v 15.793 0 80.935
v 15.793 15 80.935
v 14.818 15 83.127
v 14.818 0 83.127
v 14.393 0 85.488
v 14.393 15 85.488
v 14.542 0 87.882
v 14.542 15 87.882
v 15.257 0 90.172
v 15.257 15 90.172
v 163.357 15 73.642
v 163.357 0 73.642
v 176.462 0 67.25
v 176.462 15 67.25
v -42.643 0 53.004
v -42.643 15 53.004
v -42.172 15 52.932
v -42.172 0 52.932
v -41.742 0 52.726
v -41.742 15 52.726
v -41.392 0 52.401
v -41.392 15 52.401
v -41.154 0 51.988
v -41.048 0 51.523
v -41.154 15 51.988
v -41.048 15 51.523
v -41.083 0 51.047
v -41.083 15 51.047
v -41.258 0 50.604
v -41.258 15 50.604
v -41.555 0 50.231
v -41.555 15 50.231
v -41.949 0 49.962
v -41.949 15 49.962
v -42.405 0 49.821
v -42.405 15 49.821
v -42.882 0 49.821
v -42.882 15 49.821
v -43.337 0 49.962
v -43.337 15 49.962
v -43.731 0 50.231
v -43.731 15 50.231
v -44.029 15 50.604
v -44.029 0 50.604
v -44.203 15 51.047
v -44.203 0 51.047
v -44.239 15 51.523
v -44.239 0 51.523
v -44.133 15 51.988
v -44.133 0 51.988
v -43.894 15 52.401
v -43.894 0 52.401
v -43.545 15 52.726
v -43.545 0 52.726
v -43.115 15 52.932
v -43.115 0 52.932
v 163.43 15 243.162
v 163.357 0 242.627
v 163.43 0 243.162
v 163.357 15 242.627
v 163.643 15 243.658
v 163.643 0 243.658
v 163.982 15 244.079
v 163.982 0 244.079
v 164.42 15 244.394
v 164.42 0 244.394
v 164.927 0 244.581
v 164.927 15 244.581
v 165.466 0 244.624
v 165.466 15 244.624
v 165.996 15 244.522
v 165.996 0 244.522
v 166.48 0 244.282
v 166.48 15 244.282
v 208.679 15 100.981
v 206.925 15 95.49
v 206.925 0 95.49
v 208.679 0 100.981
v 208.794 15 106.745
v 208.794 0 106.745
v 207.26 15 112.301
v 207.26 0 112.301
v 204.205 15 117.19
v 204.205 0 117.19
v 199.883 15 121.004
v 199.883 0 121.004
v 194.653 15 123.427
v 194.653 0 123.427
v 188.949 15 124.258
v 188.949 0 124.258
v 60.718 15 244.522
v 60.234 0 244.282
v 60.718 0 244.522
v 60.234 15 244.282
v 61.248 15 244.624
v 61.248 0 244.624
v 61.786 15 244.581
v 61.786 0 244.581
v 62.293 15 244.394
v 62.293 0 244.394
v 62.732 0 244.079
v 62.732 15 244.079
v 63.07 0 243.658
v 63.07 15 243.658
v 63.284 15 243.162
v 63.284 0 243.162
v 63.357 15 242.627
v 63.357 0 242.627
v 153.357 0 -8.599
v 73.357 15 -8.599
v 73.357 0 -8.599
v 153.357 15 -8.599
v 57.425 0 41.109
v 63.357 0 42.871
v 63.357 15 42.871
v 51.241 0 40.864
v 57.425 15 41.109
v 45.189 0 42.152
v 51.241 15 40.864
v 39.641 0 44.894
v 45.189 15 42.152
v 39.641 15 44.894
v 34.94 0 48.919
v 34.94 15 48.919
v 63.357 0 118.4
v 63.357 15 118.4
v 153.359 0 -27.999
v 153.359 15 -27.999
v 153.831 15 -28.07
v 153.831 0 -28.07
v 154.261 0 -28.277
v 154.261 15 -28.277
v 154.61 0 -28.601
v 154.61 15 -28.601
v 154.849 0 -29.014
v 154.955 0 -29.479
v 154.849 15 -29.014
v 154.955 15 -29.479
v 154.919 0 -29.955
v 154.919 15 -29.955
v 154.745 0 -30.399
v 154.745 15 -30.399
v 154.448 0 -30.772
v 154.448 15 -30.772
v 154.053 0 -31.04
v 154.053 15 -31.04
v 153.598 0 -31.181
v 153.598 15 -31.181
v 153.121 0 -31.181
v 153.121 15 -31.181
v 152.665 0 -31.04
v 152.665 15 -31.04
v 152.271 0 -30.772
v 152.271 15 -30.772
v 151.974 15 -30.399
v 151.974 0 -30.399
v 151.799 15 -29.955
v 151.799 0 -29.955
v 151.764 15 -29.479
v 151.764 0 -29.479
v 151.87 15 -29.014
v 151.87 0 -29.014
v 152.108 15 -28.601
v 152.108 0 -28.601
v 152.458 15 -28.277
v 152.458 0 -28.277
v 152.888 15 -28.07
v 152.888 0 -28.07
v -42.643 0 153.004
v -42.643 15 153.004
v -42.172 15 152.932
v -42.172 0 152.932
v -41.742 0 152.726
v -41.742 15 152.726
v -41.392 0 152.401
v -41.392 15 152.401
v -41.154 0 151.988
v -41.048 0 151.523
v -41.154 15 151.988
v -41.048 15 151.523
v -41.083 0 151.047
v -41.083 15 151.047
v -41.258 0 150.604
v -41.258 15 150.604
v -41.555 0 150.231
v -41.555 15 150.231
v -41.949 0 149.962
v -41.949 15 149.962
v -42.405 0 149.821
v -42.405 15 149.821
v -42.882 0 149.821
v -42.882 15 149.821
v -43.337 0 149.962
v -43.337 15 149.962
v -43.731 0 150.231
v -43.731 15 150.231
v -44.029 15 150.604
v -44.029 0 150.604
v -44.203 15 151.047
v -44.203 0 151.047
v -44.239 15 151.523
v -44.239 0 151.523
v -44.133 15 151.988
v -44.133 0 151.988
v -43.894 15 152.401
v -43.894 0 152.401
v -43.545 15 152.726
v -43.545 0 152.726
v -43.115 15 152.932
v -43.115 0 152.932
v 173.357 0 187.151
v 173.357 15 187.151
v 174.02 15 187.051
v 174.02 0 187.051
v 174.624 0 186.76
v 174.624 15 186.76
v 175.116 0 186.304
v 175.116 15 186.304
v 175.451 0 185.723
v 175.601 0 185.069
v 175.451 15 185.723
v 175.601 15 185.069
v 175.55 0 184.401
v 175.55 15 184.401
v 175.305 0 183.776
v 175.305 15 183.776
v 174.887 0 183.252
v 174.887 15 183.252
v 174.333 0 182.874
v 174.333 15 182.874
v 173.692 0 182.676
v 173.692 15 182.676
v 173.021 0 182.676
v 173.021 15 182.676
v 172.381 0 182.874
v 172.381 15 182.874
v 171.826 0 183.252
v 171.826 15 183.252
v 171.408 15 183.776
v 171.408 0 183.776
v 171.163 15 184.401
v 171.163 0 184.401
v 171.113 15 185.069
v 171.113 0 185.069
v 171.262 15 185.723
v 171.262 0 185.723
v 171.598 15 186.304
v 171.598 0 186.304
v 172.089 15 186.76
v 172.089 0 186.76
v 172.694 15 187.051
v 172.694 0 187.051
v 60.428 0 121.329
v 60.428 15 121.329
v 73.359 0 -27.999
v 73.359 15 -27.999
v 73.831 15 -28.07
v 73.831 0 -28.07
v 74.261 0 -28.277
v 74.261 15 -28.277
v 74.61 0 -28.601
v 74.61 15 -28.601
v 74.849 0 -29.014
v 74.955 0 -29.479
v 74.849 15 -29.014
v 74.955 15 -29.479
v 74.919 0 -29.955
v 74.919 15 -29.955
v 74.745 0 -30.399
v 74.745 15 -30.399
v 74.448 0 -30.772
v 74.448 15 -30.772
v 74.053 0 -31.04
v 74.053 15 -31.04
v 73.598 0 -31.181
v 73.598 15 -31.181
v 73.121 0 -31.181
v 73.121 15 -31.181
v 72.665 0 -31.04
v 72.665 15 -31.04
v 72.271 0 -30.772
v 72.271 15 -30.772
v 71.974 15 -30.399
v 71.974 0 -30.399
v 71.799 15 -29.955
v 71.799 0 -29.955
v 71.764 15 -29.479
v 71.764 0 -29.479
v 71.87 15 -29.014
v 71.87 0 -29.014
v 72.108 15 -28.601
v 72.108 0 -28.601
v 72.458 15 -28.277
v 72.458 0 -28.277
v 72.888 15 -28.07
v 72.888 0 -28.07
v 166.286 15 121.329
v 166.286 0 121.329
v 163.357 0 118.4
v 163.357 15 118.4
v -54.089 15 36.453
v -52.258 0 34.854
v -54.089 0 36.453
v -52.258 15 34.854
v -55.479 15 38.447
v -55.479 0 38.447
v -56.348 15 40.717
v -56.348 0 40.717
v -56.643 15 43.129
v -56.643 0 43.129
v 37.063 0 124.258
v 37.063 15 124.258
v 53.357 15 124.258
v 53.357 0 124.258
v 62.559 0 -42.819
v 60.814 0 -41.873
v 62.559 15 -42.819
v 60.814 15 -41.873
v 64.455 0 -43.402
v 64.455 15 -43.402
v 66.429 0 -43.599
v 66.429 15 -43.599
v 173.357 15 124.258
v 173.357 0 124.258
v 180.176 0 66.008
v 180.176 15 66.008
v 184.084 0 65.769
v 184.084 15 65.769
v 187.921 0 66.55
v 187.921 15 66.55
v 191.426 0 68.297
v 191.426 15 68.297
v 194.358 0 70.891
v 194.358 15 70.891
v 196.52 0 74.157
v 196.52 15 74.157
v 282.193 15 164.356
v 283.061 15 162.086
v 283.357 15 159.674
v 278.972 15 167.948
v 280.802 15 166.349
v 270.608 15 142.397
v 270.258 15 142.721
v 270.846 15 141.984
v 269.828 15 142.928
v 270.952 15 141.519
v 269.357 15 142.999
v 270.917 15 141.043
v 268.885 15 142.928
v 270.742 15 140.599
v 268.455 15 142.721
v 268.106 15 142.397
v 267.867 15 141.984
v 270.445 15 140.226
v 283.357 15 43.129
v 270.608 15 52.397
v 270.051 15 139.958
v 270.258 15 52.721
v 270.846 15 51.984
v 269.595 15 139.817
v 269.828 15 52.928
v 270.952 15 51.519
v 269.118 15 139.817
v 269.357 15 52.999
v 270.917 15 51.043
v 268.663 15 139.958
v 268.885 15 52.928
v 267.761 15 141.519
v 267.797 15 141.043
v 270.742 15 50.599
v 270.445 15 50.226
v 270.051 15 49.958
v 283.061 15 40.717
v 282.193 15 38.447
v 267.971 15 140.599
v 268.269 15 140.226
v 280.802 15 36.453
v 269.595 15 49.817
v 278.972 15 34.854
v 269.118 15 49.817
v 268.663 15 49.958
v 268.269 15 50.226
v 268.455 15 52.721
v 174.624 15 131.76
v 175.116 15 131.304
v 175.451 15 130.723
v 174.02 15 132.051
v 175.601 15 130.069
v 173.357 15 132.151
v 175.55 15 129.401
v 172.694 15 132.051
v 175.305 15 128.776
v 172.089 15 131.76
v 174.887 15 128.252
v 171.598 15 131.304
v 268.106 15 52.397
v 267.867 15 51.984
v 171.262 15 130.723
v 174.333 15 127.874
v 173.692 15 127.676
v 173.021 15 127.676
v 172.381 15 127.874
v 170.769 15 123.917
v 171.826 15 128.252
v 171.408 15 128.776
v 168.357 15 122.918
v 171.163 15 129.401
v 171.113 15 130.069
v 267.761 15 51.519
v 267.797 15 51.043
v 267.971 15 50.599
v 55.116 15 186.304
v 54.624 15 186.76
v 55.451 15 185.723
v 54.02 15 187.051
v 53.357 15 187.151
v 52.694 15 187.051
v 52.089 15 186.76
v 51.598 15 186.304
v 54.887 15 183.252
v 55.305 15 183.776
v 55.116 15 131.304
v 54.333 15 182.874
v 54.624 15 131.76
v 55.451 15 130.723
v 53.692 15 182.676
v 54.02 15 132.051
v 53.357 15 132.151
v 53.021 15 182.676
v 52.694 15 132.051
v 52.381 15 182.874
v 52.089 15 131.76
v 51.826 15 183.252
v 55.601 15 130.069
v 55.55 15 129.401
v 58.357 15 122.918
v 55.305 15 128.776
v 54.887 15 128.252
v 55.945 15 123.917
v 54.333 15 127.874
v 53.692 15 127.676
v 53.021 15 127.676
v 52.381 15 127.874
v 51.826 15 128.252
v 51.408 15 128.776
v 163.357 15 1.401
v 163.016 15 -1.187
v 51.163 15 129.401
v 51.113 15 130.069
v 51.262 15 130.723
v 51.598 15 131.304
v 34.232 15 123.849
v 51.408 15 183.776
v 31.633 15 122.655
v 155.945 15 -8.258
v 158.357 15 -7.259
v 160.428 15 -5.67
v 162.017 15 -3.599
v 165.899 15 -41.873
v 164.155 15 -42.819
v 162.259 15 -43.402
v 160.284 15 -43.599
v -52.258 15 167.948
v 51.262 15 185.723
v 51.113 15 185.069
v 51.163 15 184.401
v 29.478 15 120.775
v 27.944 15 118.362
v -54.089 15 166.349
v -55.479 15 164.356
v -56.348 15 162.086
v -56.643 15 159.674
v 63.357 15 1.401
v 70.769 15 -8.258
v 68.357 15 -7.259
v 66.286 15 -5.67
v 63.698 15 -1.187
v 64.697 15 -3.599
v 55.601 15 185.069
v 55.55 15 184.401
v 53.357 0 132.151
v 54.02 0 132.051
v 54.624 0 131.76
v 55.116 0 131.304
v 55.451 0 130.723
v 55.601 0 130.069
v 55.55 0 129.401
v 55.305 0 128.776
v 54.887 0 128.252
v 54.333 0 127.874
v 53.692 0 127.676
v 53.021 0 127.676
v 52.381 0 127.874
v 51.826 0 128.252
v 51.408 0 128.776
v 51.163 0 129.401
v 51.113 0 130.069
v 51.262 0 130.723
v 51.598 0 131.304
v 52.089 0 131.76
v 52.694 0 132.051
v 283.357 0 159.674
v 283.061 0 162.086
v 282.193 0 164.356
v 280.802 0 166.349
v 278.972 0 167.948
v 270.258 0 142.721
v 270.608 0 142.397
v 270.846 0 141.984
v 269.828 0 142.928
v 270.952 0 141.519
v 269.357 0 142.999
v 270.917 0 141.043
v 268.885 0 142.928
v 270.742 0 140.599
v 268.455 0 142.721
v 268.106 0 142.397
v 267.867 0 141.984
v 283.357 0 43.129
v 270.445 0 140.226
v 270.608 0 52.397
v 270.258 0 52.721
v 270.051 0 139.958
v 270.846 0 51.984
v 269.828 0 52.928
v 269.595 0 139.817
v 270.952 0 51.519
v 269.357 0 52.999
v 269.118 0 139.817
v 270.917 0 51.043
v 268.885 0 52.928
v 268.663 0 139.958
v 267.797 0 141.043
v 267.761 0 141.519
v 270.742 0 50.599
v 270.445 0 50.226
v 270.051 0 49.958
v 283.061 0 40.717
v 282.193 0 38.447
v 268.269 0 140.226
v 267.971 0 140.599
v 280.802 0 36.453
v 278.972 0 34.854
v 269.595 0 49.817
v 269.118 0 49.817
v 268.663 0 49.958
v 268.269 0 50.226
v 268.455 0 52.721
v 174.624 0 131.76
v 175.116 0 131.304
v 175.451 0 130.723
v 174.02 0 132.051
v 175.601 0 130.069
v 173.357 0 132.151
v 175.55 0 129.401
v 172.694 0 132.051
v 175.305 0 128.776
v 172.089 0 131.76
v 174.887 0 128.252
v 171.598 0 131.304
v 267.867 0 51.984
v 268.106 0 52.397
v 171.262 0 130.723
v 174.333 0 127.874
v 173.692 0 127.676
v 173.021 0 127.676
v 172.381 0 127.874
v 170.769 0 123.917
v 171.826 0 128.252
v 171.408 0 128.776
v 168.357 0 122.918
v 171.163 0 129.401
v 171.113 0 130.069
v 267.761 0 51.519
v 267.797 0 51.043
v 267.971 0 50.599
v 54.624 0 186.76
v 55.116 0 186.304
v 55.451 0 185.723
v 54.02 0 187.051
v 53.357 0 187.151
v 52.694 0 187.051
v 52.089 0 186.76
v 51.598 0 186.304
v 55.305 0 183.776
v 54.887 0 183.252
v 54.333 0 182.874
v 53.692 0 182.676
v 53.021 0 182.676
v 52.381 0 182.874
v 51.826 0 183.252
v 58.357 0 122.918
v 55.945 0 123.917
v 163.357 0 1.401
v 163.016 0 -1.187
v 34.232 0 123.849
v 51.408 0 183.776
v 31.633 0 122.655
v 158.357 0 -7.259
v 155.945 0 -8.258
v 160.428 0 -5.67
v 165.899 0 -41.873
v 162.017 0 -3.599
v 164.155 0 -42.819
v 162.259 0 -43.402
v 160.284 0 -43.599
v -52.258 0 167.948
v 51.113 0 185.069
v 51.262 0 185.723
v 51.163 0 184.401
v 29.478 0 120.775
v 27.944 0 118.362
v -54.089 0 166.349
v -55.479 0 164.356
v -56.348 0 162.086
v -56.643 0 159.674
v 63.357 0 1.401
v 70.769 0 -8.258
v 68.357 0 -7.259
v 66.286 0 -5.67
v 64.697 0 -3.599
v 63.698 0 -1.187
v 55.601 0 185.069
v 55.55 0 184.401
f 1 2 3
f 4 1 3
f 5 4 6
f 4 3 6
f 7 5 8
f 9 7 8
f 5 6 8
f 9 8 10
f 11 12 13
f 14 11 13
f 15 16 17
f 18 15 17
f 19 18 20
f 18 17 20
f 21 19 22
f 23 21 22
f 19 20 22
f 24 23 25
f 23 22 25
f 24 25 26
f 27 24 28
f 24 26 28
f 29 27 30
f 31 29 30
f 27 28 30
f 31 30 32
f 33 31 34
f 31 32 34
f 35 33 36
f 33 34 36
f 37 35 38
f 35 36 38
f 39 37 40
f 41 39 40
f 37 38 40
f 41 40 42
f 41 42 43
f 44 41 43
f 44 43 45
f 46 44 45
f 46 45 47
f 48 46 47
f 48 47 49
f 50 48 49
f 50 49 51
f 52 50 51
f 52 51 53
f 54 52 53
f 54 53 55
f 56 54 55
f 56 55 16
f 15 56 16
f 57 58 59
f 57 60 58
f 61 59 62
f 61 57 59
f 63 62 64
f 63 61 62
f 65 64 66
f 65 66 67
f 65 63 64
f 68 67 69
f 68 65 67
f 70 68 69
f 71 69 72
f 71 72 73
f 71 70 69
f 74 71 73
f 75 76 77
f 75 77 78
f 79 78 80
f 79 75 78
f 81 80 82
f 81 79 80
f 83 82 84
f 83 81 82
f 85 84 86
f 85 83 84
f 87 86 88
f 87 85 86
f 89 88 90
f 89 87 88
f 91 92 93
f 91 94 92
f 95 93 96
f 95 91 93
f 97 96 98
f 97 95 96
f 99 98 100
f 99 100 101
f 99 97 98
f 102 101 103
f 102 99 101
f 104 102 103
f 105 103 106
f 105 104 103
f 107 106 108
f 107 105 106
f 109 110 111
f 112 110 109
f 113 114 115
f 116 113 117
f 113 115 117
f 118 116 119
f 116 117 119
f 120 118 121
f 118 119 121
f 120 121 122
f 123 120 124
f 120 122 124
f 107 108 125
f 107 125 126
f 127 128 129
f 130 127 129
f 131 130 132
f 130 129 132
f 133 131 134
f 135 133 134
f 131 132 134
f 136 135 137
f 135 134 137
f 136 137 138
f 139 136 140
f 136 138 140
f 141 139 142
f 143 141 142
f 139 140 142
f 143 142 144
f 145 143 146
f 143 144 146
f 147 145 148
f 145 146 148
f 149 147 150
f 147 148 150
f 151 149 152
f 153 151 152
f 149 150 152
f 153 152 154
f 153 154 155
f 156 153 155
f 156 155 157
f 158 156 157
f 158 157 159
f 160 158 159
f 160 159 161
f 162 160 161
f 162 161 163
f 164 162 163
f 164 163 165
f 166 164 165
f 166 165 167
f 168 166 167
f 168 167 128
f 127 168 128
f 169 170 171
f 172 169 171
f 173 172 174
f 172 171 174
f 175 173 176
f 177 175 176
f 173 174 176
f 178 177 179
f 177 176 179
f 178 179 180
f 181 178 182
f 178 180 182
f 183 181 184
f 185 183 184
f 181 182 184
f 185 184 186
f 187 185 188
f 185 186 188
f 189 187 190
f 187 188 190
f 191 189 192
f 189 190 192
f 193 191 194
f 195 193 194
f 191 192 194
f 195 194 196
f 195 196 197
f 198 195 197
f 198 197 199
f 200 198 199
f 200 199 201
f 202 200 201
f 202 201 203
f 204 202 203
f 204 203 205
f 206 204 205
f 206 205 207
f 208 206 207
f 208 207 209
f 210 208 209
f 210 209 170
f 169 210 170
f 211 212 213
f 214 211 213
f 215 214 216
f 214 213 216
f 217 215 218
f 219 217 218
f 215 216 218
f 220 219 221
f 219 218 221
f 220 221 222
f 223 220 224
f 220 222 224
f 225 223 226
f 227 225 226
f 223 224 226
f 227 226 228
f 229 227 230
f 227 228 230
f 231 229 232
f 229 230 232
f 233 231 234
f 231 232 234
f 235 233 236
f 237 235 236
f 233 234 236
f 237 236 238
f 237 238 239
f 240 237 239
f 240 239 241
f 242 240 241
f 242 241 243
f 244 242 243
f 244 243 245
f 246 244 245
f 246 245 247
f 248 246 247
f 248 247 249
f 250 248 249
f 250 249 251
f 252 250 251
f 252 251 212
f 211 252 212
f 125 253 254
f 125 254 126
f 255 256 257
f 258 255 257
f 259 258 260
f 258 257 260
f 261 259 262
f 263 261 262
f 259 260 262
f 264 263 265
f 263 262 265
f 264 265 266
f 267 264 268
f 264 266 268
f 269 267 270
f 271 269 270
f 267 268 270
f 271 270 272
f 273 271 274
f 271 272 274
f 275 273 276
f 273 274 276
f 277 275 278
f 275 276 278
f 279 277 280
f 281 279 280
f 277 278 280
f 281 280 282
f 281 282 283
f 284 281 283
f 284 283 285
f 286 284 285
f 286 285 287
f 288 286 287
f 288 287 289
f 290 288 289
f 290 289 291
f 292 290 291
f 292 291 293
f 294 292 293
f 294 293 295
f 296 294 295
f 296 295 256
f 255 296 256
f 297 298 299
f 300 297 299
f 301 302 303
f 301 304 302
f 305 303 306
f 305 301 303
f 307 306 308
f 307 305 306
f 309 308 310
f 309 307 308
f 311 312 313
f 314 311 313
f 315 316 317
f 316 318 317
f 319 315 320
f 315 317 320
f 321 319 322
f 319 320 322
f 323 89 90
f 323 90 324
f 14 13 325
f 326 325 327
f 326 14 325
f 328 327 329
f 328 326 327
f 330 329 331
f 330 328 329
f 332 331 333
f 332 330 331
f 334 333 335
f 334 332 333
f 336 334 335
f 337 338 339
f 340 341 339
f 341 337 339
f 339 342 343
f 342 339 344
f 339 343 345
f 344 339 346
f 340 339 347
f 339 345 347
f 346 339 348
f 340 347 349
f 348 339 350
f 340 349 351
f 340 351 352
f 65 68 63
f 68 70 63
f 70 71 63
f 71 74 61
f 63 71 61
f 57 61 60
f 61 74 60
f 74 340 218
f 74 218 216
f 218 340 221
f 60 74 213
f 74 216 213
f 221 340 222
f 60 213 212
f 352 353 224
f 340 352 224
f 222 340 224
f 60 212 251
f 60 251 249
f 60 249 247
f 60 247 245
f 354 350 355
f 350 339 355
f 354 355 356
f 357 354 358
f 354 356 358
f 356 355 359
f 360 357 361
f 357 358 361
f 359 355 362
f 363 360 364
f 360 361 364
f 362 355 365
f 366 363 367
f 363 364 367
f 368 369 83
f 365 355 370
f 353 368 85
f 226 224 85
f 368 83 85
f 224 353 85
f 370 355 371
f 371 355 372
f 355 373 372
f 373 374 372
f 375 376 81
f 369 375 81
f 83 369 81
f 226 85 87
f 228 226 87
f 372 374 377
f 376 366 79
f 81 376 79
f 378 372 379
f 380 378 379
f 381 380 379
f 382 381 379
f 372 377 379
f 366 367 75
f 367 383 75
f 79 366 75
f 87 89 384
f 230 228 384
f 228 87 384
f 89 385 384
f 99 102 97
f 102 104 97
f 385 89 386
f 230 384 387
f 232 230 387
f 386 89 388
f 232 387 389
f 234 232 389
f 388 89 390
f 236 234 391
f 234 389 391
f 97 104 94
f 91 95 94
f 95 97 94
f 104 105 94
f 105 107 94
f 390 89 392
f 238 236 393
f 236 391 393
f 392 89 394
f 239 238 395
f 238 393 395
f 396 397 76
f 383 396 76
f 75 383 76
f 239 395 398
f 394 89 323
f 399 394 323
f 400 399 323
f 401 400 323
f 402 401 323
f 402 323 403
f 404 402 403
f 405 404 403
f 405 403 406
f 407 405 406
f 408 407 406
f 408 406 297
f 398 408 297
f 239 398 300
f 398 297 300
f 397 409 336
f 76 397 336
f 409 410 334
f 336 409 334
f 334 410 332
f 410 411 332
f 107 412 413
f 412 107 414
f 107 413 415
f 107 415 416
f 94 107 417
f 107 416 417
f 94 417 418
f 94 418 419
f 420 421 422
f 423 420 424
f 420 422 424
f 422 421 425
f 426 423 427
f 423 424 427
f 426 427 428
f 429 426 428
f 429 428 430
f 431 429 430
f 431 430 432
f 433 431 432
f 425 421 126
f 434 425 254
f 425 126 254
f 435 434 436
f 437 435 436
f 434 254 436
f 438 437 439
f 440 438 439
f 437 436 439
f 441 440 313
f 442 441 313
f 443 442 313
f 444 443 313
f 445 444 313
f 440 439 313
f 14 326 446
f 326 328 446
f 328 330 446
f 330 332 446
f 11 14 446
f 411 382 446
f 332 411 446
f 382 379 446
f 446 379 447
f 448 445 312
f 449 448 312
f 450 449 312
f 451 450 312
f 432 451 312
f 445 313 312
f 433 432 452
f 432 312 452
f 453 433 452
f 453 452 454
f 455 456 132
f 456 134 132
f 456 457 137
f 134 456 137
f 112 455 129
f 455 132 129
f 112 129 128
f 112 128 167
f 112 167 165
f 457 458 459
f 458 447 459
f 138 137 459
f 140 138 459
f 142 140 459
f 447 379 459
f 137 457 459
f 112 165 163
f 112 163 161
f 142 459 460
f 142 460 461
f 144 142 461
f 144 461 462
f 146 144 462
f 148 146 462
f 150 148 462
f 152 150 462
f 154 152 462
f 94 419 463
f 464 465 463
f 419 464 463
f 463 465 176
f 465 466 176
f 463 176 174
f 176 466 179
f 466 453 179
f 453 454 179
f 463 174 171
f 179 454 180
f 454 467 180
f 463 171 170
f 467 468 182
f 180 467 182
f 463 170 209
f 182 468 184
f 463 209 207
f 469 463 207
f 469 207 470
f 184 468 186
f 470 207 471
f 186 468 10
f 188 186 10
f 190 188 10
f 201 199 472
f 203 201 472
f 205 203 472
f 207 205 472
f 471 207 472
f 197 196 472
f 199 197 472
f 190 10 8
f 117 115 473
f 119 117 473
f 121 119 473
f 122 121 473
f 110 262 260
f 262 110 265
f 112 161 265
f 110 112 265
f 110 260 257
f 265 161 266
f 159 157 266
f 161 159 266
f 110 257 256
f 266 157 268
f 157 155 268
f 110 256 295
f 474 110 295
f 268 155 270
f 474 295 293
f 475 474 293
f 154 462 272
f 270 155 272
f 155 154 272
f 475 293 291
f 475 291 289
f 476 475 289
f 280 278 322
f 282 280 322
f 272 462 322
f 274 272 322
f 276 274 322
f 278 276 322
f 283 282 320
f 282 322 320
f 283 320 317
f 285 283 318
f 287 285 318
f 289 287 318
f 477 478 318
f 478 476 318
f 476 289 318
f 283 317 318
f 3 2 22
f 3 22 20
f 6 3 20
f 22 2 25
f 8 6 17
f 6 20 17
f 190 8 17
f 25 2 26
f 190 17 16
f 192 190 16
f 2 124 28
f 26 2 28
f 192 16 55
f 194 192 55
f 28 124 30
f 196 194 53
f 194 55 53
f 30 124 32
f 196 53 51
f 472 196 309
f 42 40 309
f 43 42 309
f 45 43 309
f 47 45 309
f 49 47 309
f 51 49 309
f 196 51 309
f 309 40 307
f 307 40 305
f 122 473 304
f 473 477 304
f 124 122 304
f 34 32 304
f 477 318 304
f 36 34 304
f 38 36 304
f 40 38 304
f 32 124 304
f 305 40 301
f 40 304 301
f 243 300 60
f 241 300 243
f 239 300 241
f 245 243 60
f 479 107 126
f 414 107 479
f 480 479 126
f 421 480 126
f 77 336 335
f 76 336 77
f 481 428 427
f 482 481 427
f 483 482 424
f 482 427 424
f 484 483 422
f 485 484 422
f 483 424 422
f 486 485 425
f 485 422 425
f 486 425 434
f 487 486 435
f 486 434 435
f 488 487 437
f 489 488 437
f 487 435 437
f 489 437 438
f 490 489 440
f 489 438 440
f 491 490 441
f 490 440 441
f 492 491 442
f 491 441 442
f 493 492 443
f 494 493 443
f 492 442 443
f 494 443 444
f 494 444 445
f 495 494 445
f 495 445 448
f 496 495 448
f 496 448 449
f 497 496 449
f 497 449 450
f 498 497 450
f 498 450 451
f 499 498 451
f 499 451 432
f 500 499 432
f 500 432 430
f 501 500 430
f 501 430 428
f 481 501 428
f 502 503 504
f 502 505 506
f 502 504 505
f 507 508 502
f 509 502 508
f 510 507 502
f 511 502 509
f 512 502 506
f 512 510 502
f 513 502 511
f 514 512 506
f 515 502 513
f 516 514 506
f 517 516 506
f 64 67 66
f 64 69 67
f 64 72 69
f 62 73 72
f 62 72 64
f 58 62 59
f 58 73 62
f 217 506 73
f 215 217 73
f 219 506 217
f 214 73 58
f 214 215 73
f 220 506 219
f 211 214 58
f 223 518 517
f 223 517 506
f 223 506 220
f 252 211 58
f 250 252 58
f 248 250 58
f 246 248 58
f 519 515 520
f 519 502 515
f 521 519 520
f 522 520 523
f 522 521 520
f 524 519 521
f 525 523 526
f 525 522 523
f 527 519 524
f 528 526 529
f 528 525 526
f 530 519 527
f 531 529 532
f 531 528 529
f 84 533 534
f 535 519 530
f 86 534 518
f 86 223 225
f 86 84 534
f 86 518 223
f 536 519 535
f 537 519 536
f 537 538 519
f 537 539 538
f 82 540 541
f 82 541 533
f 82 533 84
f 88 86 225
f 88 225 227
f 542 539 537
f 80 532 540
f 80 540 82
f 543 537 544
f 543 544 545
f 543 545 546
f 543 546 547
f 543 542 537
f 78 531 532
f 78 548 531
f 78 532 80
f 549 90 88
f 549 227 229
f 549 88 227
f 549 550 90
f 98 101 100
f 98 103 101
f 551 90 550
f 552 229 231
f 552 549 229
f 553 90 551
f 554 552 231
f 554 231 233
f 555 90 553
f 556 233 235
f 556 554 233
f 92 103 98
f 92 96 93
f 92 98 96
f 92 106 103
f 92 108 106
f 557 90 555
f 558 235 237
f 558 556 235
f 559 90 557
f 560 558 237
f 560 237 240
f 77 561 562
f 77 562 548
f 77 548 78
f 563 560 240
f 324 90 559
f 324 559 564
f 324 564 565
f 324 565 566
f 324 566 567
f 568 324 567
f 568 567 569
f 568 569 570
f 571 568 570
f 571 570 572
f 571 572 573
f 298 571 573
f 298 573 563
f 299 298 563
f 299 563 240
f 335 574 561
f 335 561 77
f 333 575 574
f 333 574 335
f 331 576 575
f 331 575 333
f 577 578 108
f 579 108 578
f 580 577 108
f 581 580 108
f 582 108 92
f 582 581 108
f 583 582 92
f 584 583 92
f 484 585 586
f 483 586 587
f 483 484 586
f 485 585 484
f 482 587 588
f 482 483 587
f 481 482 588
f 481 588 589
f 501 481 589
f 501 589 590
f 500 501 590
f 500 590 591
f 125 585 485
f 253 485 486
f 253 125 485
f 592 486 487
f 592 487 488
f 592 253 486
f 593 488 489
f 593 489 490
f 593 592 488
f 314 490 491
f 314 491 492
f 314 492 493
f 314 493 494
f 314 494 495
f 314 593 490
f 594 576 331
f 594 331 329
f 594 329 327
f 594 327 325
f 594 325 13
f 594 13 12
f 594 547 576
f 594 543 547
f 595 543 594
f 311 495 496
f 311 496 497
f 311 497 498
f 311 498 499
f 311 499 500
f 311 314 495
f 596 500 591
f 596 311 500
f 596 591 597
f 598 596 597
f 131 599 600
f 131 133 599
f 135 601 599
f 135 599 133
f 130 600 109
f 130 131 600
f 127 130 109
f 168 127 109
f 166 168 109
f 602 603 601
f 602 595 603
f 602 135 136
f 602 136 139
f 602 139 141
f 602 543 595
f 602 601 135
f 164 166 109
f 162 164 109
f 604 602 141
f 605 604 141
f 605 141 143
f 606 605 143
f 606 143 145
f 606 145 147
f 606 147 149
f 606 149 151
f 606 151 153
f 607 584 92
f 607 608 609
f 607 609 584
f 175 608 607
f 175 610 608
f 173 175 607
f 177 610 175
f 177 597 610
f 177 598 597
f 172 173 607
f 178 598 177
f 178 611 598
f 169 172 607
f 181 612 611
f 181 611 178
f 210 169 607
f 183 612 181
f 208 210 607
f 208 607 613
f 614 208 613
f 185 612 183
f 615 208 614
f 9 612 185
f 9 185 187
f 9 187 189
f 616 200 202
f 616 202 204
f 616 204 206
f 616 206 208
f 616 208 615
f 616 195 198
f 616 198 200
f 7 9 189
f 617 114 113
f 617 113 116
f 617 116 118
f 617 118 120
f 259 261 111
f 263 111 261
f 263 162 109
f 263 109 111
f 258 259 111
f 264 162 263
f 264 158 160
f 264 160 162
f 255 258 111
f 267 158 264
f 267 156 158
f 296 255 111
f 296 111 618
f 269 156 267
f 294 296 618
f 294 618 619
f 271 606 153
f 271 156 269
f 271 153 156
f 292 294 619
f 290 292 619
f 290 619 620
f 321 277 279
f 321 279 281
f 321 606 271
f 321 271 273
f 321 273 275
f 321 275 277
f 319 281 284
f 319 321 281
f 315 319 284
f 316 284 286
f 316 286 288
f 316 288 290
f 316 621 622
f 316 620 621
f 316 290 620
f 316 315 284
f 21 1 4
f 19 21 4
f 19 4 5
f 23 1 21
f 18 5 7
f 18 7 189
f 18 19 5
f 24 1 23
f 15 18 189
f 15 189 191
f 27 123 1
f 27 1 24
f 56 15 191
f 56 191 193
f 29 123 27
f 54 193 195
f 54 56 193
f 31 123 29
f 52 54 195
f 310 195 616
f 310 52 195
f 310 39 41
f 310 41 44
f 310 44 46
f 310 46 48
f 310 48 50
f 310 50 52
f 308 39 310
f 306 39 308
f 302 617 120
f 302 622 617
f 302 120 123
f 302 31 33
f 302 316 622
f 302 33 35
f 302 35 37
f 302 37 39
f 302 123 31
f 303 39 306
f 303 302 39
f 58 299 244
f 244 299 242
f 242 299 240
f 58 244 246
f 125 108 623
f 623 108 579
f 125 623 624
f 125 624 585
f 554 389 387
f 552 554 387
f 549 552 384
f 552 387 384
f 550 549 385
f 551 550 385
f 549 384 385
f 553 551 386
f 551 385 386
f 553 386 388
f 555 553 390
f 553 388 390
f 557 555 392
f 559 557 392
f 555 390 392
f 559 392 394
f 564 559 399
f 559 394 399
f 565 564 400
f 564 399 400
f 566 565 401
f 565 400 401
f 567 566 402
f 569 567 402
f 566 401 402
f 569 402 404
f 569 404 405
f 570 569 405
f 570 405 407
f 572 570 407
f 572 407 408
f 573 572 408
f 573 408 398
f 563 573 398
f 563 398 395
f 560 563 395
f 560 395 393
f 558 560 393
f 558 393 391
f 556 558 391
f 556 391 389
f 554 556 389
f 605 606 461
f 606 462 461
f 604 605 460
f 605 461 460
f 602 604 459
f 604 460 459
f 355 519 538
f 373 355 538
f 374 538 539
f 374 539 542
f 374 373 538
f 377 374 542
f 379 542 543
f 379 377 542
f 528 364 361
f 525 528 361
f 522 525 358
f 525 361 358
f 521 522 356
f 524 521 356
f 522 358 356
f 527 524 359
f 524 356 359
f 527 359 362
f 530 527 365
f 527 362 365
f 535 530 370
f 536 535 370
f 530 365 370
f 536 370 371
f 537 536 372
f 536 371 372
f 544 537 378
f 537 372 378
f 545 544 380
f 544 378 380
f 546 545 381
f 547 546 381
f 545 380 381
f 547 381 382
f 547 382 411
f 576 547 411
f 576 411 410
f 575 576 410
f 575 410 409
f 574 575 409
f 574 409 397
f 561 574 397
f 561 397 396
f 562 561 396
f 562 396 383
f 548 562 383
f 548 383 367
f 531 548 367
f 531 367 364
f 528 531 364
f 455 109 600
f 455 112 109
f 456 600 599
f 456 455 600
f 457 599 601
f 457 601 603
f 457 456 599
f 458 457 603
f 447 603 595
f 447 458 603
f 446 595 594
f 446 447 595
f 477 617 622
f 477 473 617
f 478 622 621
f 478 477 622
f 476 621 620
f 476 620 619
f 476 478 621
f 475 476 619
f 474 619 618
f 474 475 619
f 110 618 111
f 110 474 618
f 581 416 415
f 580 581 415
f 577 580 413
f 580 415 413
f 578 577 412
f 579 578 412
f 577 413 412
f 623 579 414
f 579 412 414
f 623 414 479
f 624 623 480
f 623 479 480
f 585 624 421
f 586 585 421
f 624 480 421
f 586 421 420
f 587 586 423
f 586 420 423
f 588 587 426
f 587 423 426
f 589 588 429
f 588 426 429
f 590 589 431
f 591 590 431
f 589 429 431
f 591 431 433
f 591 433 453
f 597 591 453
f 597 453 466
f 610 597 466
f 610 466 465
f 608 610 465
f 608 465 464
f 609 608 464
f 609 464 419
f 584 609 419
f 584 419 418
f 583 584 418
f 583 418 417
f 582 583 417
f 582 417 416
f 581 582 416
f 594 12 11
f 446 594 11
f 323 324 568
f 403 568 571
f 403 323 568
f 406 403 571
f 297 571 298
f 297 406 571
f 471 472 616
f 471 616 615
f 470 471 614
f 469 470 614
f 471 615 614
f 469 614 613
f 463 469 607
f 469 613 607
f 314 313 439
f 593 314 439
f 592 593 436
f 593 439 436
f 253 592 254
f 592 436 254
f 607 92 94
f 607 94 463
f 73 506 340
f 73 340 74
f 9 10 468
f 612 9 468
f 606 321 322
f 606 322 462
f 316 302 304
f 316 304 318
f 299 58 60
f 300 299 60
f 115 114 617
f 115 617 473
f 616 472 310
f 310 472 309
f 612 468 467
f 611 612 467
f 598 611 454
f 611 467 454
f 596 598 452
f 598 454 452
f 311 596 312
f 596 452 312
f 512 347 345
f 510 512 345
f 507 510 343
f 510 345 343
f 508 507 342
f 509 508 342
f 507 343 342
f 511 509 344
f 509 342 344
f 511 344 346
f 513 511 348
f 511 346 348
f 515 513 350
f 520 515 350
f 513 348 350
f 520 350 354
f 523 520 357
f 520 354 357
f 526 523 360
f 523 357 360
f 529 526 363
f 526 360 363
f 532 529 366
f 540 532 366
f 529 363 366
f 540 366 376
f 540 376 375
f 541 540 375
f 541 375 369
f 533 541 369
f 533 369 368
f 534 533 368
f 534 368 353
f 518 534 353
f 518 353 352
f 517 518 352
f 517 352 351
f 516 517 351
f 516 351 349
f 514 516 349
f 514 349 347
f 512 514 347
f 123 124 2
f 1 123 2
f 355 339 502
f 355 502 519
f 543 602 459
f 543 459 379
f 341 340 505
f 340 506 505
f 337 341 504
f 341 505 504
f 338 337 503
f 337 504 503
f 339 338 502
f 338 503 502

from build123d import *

# Parameters (mm, degrees)
BOSS_EXTRU_1_DEPTH       = 15
ESQUISSE6_W              = 100
ESQUISSE6_H              = 15
ENL_V_MAT_EXTRU_1_DEPTH  = 255
ENL_V_MAT_EXTRU_10_REACH = 393.106
ESQUISSE11_R             = 2.25
ENL_V_MAT_EXTRU_11_REACH = 393.106
ESQUISSE8_R              = 2.25
CONG_10_R                = 10
CONG_11_R                = 2
ENL_V_MAT_EXTRU_12_REACH = 391.991
ENL_V_MAT_EXTRU_13_REACH = 391.991
ESQUISSE13_W             = 20
ESQUISSE13_H             = 143.033455182
ESQUISSE13_H_2           = 181.308681646
CONG_12_R                = 10
ENL_V_MAT_EXTRU_14_REACH = 376.645
ESQUISSE14_R             = 1.6


with BuildPart() as part:
    # Esquisse1 → Boss.-Extru.1 (new body)
    with BuildSketch(Plane(origin=(0, 0, 0), x_dir=(1, 0, 0), z_dir=(0, 1, 0))):
        Polygon((-76.643189126, -51.401333399), (63.356810874, 43.598666601), (163.356810874, 43.598666601), (303.356810874, -51.401333399), (303.356810874, -151.401333399), (163.356810874, -246.401333399), (63.356810874, -246.401333399), (-76.643189126, -151.401333399), align=None)
    extrude(amount=BOSS_EXTRU_1_DEPTH)

    # Esquisse6 → Enlèv. mat.-Extru.1 (cut)
    with BuildSketch(Plane.XY.offset(246.401333399)):
        with Locations((113.356810874, 7.5)):
            Rectangle(ESQUISSE6_W, ESQUISSE6_H)
    extrude(amount=-ENL_V_MAT_EXTRU_1_DEPTH, mode=Mode.SUBTRACT)

    # Esquisse11 → Enlèv. mat.-Extru.10 (cut, up to next)
    with BuildSketch(Plane(origin=(0, 15, 0), x_dir=(1, 0, 0), z_dir=(0, 1, 0)), mode=Mode.PRIVATE) as enl_v_mat_extru_10_sk1:
        with Locations(Location((53.356810874, -129.901333399, 0), (0, 0, 270))):
            Circle(ESQUISSE11_R)
    enl_v_mat_extru_10_tool1 = extrude(enl_v_mat_extru_10_sk1.sketch, amount=-ENL_V_MAT_EXTRU_10_REACH, mode=Mode.PRIVATE) & part.part
    # Esquisse11 → Enlèv. mat.-Extru.10 (cut, up to next)
    with BuildSketch(Plane(origin=(0, 15, 0), x_dir=(1, 0, 0), z_dir=(0, 1, 0)), mode=Mode.PRIVATE) as enl_v_mat_extru_10_sk2:
        with Locations(Location((53.356810874, -184.901333399, 0), (0, 0, 270))):
            Circle(ESQUISSE11_R)
    enl_v_mat_extru_10_tool2 = extrude(enl_v_mat_extru_10_sk2.sketch, amount=-ENL_V_MAT_EXTRU_10_REACH, mode=Mode.PRIVATE) & part.part
    # Esquisse11 → Enlèv. mat.-Extru.10 (cut, up to next)
    with BuildSketch(Plane(origin=(0, 15, 0), x_dir=(1, 0, 0), z_dir=(0, 1, 0)), mode=Mode.PRIVATE) as enl_v_mat_extru_10_sk3:
        with Locations(Location((173.356810874, -129.901333399, 0), (0, 0, 270))):
            Circle(ESQUISSE11_R)
    enl_v_mat_extru_10_tool3 = extrude(enl_v_mat_extru_10_sk3.sketch, amount=-ENL_V_MAT_EXTRU_10_REACH, mode=Mode.PRIVATE) & part.part
    # Esquisse11 → Enlèv. mat.-Extru.10 (cut, up to next)
    with BuildSketch(Plane(origin=(0, 15, 0), x_dir=(1, 0, 0), z_dir=(0, 1, 0)), mode=Mode.PRIVATE) as enl_v_mat_extru_10_sk4:
        with Locations(Location((173.356810874, -184.901333399, 0), (0, 0, 270))):
            Circle(ESQUISSE11_R)
    enl_v_mat_extru_10_tool4 = extrude(enl_v_mat_extru_10_sk4.sketch, amount=-ENL_V_MAT_EXTRU_10_REACH, mode=Mode.PRIVATE) & part.part
    add(enl_v_mat_extru_10_tool1.solids().sort_by_distance((53.356811, 15, 129.901333))[0], mode=Mode.SUBTRACT)
    add(enl_v_mat_extru_10_tool2.solids().sort_by_distance((53.356811, 15, 184.901333))[0], mode=Mode.SUBTRACT)
    add(enl_v_mat_extru_10_tool3.solids().sort_by_distance((173.356811, 15, 129.901333))[0], mode=Mode.SUBTRACT)
    add(enl_v_mat_extru_10_tool4.solids().sort_by_distance((173.356811, 15, 184.901333))[0], mode=Mode.SUBTRACT)

    # Esquisse8 → Enlèv. mat.-Extru.11 (cut, up to next)
    with BuildSketch(Plane(origin=(0, 15, 0), x_dir=(1, 0, 0), z_dir=(0, 1, 0)), mode=Mode.PRIVATE) as enl_v_mat_extru_11_sk1:
        with Locations(Location((180.356810874, -120.901333399, 0), (0, 0, 270))):
            Circle(ESQUISSE8_R)
    enl_v_mat_extru_11_tool1 = extrude(enl_v_mat_extru_11_sk1.sketch, amount=-ENL_V_MAT_EXTRU_11_REACH, mode=Mode.PRIVATE) & part.part
    # Esquisse8 → Enlèv. mat.-Extru.11 (cut, up to next)
    with BuildSketch(Plane(origin=(0, 15, 0), x_dir=(1, 0, 0), z_dir=(0, 1, 0)), mode=Mode.PRIVATE) as enl_v_mat_extru_11_sk2:
        with Locations(Location((180.356810874, -81.901333399, 0), (0, 0, 270))):
            Circle(ESQUISSE8_R)
    enl_v_mat_extru_11_tool2 = extrude(enl_v_mat_extru_11_sk2.sketch, amount=-ENL_V_MAT_EXTRU_11_REACH, mode=Mode.PRIVATE) & part.part
    # Esquisse8 → Enlèv. mat.-Extru.11 (cut, up to next)
    with BuildSketch(Plane(origin=(0, 15, 0), x_dir=(1, 0, 0), z_dir=(0, 1, 0)), mode=Mode.PRIVATE) as enl_v_mat_extru_11_sk3:
        with Locations(Location((46.356810874, -120.901333399, 0), (0, 0, 270))):
            Circle(ESQUISSE8_R)
    enl_v_mat_extru_11_tool3 = extrude(enl_v_mat_extru_11_sk3.sketch, amount=-ENL_V_MAT_EXTRU_11_REACH, mode=Mode.PRIVATE) & part.part
    # Esquisse8 → Enlèv. mat.-Extru.11 (cut, up to next)
    with BuildSketch(Plane(origin=(0, 15, 0), x_dir=(1, 0, 0), z_dir=(0, 1, 0)), mode=Mode.PRIVATE) as enl_v_mat_extru_11_sk4:
        with Locations(Location((46.356810874, -81.901333399, 0), (0, 0, 270))):
            Circle(ESQUISSE8_R)
    enl_v_mat_extru_11_tool4 = extrude(enl_v_mat_extru_11_sk4.sketch, amount=-ENL_V_MAT_EXTRU_11_REACH, mode=Mode.PRIVATE) & part.part
    add(enl_v_mat_extru_11_tool1.solids().sort_by_distance((180.356811, 15, 120.901333))[0], mode=Mode.SUBTRACT)
    add(enl_v_mat_extru_11_tool2.solids().sort_by_distance((180.356811, 15, 81.901333))[0], mode=Mode.SUBTRACT)
    add(enl_v_mat_extru_11_tool3.solids().sort_by_distance((46.356811, 15, 120.901333))[0], mode=Mode.SUBTRACT)
    add(enl_v_mat_extru_11_tool4.solids().sort_by_distance((46.356811, 15, 81.901333))[0], mode=Mode.SUBTRACT)

    # Congé10
    cong_10_edges = [part.edges().sort_by_distance(p)[0] for p in [
        (-76.643189126, 7.5, 51.401333399),
        (63.356810874, 7.5, -43.598666601),
        (163.356810874, 7.5, -43.598666601),
        (303.356810874, 7.5, 51.401333399),
        (303.356810874, 7.5, 151.401333399),
        (-76.643189126, 7.5, 151.401333399),
        (63.356810874, 7.5, -8.598666601),
        (163.356810874, 7.5, -8.598666601),
    ]]
    fillet(cong_10_edges, radius=CONG_10_R)

    # Congé11
    cong_11_edges = [part.edges().sort_by_distance(p)[0] for p in [
        (163.356810874, 7.5, 246.401333399),
        (63.356810874, 7.5, 246.401333399),
    ]]
    fillet(cong_11_edges, radius=CONG_11_R)

    # Esquisse12 → Enlèv. mat.-Extru.12 (cut, up to next)
    with BuildSketch(Plane(origin=(0, 15, 0), x_dir=(1, 0, 0), z_dir=(0, 1, 0)), mode=Mode.PRIVATE) as enl_v_mat_extru_12_sk1:
        with BuildLine():
            Line((34.940182765, -48.918575783), (15.793326272, -80.935246354))
            ThreePointArc((15.793326272, -80.935246354), (14.39255048, -85.48771654), (15.256670784, -90.171780344))
            Line((15.256670784, -90.171780344), (27.943631129, -118.361875593))
            ThreePointArc((27.943631129, -118.361875593), (31.633138728, -122.655474578), (37.06267458, -124.257847507))
            Line((37.06267458, -124.257847507), (53.356810874, -124.257847507))
            ThreePointArc((53.356810874, -124.257847507), (57.183645198, -123.496642832), (60.427878686, -121.328915318))
            Line((60.427878686, -121.328915318), (63.356810874, -118.39998313))
            Line((63.356810874, -118.39998313), (63.356810874, -59.592280682))
            Line((63.356810874, -59.592280682), (64.824779414, -43.572926285))
            ThreePointArc((64.824779414, -43.572926285), (48.973323725, -41.163150472), (34.940182765, -48.918575783))
        make_face()
    enl_v_mat_extru_12_tool1 = extrude(enl_v_mat_extru_12_sk1.sketch, amount=-ENL_V_MAT_EXTRU_12_REACH, mode=Mode.PRIVATE) & part.part
    # Esquisse12 → Enlèv. mat.-Extru.12 (cut, up to next)
    with BuildSketch(Plane(origin=(0, 15, 0), x_dir=(1, 0, 0), z_dir=(0, 1, 0)), mode=Mode.PRIVATE) as enl_v_mat_extru_12_sk2:
        with BuildLine():
            Line((166.285743062, -121.328915318), (163.356810874, -118.39998313))
            Line((163.356810874, -118.39998313), (163.356810874, -73.642376596))
            Line((163.356810874, -73.642376596), (176.462200108, -67.250451181))
            ThreePointArc((176.462200108, -67.250451181), (187.921289626, -66.549583242), (196.519678004, -74.156794674))
            Line((196.519678004, -74.156794674), (206.924784537, -95.490424571))
            ThreePointArc((206.924784537, -95.490424571), (205.909865534, -114.856232791), (188.948903611, -124.257847507))
            Line((188.948903611, -124.257847507), (173.356810874, -124.257847507))
            ThreePointArc((173.356810874, -124.257847507), (169.529976551, -123.496642832), (166.285743062, -121.328915318))
        make_face()
    enl_v_mat_extru_12_tool2 = extrude(enl_v_mat_extru_12_sk2.sketch, amount=-ENL_V_MAT_EXTRU_12_REACH, mode=Mode.PRIVATE) & part.part
    add(enl_v_mat_extru_12_tool1.solids().sort_by_distance((43.224361, 15, 84.406415))[0], mode=Mode.SUBTRACT)
    add(enl_v_mat_extru_12_tool2.solids().sort_by_distance((183.873626, 15, 97.045657))[0], mode=Mode.SUBTRACT)

    # Esquisse13 → Enlèv. mat.-Extru.13 (cut, up to next)
    with BuildSketch(Plane(origin=(0, 15, 0), x_dir=(1, 0, 0), z_dir=(0, 1, 0)), mode=Mode.PRIVATE) as enl_v_mat_extru_13_sk1:
        with Locations((-66.643189126, -101.968599131)):
            Rectangle(ESQUISSE13_W, ESQUISSE13_H)
    enl_v_mat_extru_13_tool1 = extrude(enl_v_mat_extru_13_sk1.sketch, amount=-ENL_V_MAT_EXTRU_13_REACH, mode=Mode.PRIVATE) & part.part
    # Esquisse13 → Enlèv. mat.-Extru.13 (cut, up to next)
    with BuildSketch(Plane(origin=(0, 15, 0), x_dir=(1, 0, 0), z_dir=(0, 1, 0)), mode=Mode.PRIVATE) as enl_v_mat_extru_13_sk2:
        with Locations((293.356810874, -101.059068944)):
            Rectangle(ESQUISSE13_W, ESQUISSE13_H_2)
    enl_v_mat_extru_13_tool2 = extrude(enl_v_mat_extru_13_sk2.sketch, amount=-ENL_V_MAT_EXTRU_13_REACH, mode=Mode.PRIVATE) & part.part
    add(enl_v_mat_extru_13_tool1.solids().sort_by_distance((-66.643189, 15, 101.968599))[0], mode=Mode.SUBTRACT)
    add(enl_v_mat_extru_13_tool2.solids().sort_by_distance((293.356811, 15, 101.059069))[0], mode=Mode.SUBTRACT)

    # Congé12
    cong_12_edges = [part.edges().sort_by_distance(p)[0] for p in [
        (-56.643189126, 7.5, 37.829904828),
        (-56.643189126, 7.5, 164.97276197),
        (283.356810874, 7.5, 37.829904828),
        (283.356810874, 7.5, 164.97276197),
    ]]
    fillet(cong_12_edges, radius=CONG_12_R)

    # Esquisse14 → Enlèv. mat.-Extru.14 (cut, up to next)
    with BuildSketch(Plane(origin=(0, 15, 0), x_dir=(1, 0, 0), z_dir=(0, 1, 0)), mode=Mode.PRIVATE) as enl_v_mat_extru_14_sk1:
        with Locations(Location((-42.643189126, -51.403530316, 0), (0, 0, 270))):
            Circle(ESQUISSE14_R)
    enl_v_mat_extru_14_tool1 = extrude(enl_v_mat_extru_14_sk1.sketch, amount=-ENL_V_MAT_EXTRU_14_REACH, mode=Mode.PRIVATE) & part.part
    # Esquisse14 → Enlèv. mat.-Extru.14 (cut, up to next)
    with BuildSketch(Plane(origin=(0, 15, 0), x_dir=(1, 0, 0), z_dir=(0, 1, 0)), mode=Mode.PRIVATE) as enl_v_mat_extru_14_sk2:
        with Locations(Location((-42.643189126, -151.403530316, 0), (0, 0, 270))):
            Circle(ESQUISSE14_R)
    enl_v_mat_extru_14_tool2 = extrude(enl_v_mat_extru_14_sk2.sketch, amount=-ENL_V_MAT_EXTRU_14_REACH, mode=Mode.PRIVATE) & part.part
    # Esquisse14 → Enlèv. mat.-Extru.14 (cut, up to next)
    with BuildSketch(Plane(origin=(0, 15, 0), x_dir=(1, 0, 0), z_dir=(0, 1, 0)), mode=Mode.PRIVATE) as enl_v_mat_extru_14_sk3:
        with Locations(Location((73.359258963, 29.598666601, 0), (0, 0, 270))):
            Circle(ESQUISSE14_R)
    enl_v_mat_extru_14_tool3 = extrude(enl_v_mat_extru_14_sk3.sketch, amount=-ENL_V_MAT_EXTRU_14_REACH, mode=Mode.PRIVATE) & part.part
    # Esquisse14 → Enlèv. mat.-Extru.14 (cut, up to next)
    with BuildSketch(Plane(origin=(0, 15, 0), x_dir=(1, 0, 0), z_dir=(0, 1, 0)), mode=Mode.PRIVATE) as enl_v_mat_extru_14_sk4:
        with Locations(Location((153.359258963, 29.598666601, 0), (0, 0, 270))):
            Circle(ESQUISSE14_R)
    enl_v_mat_extru_14_tool4 = extrude(enl_v_mat_extru_14_sk4.sketch, amount=-ENL_V_MAT_EXTRU_14_REACH, mode=Mode.PRIVATE) & part.part
    # Esquisse14 → Enlèv. mat.-Extru.14 (cut, up to next)
    with BuildSketch(Plane(origin=(0, 15, 0), x_dir=(1, 0, 0), z_dir=(0, 1, 0)), mode=Mode.PRIVATE) as enl_v_mat_extru_14_sk5:
        with Locations(Location((269.356810874, -51.399136482, 0), (0, 0, 270))):
            Circle(ESQUISSE14_R)
    enl_v_mat_extru_14_tool5 = extrude(enl_v_mat_extru_14_sk5.sketch, amount=-ENL_V_MAT_EXTRU_14_REACH, mode=Mode.PRIVATE) & part.part
    # Esquisse14 → Enlèv. mat.-Extru.14 (cut, up to next)
    with BuildSketch(Plane(origin=(0, 15, 0), x_dir=(1, 0, 0), z_dir=(0, 1, 0)), mode=Mode.PRIVATE) as enl_v_mat_extru_14_sk6:
        with Locations(Location((269.356810874, -141.399136482, 0), (0, 0, 270))):
            Circle(ESQUISSE14_R)
    enl_v_mat_extru_14_tool6 = extrude(enl_v_mat_extru_14_sk6.sketch, amount=-ENL_V_MAT_EXTRU_14_REACH, mode=Mode.PRIVATE) & part.part
    add(enl_v_mat_extru_14_tool1.solids().sort_by_distance((-42.643189, 15, 51.40353))[0], mode=Mode.SUBTRACT)
    add(enl_v_mat_extru_14_tool2.solids().sort_by_distance((-42.643189, 15, 151.40353))[0], mode=Mode.SUBTRACT)
    add(enl_v_mat_extru_14_tool3.solids().sort_by_distance((73.359259, 15, -29.598667))[0], mode=Mode.SUBTRACT)
    add(enl_v_mat_extru_14_tool4.solids().sort_by_distance((153.359259, 15, -29.598667))[0], mode=Mode.SUBTRACT)
    add(enl_v_mat_extru_14_tool5.solids().sort_by_distance((269.356811, 15, 51.399136))[0], mode=Mode.SUBTRACT)
    add(enl_v_mat_extru_14_tool6.solids().sort_by_distance((269.356811, 15, 141.399136))[0], mode=Mode.SUBTRACT)


solid = part.part
